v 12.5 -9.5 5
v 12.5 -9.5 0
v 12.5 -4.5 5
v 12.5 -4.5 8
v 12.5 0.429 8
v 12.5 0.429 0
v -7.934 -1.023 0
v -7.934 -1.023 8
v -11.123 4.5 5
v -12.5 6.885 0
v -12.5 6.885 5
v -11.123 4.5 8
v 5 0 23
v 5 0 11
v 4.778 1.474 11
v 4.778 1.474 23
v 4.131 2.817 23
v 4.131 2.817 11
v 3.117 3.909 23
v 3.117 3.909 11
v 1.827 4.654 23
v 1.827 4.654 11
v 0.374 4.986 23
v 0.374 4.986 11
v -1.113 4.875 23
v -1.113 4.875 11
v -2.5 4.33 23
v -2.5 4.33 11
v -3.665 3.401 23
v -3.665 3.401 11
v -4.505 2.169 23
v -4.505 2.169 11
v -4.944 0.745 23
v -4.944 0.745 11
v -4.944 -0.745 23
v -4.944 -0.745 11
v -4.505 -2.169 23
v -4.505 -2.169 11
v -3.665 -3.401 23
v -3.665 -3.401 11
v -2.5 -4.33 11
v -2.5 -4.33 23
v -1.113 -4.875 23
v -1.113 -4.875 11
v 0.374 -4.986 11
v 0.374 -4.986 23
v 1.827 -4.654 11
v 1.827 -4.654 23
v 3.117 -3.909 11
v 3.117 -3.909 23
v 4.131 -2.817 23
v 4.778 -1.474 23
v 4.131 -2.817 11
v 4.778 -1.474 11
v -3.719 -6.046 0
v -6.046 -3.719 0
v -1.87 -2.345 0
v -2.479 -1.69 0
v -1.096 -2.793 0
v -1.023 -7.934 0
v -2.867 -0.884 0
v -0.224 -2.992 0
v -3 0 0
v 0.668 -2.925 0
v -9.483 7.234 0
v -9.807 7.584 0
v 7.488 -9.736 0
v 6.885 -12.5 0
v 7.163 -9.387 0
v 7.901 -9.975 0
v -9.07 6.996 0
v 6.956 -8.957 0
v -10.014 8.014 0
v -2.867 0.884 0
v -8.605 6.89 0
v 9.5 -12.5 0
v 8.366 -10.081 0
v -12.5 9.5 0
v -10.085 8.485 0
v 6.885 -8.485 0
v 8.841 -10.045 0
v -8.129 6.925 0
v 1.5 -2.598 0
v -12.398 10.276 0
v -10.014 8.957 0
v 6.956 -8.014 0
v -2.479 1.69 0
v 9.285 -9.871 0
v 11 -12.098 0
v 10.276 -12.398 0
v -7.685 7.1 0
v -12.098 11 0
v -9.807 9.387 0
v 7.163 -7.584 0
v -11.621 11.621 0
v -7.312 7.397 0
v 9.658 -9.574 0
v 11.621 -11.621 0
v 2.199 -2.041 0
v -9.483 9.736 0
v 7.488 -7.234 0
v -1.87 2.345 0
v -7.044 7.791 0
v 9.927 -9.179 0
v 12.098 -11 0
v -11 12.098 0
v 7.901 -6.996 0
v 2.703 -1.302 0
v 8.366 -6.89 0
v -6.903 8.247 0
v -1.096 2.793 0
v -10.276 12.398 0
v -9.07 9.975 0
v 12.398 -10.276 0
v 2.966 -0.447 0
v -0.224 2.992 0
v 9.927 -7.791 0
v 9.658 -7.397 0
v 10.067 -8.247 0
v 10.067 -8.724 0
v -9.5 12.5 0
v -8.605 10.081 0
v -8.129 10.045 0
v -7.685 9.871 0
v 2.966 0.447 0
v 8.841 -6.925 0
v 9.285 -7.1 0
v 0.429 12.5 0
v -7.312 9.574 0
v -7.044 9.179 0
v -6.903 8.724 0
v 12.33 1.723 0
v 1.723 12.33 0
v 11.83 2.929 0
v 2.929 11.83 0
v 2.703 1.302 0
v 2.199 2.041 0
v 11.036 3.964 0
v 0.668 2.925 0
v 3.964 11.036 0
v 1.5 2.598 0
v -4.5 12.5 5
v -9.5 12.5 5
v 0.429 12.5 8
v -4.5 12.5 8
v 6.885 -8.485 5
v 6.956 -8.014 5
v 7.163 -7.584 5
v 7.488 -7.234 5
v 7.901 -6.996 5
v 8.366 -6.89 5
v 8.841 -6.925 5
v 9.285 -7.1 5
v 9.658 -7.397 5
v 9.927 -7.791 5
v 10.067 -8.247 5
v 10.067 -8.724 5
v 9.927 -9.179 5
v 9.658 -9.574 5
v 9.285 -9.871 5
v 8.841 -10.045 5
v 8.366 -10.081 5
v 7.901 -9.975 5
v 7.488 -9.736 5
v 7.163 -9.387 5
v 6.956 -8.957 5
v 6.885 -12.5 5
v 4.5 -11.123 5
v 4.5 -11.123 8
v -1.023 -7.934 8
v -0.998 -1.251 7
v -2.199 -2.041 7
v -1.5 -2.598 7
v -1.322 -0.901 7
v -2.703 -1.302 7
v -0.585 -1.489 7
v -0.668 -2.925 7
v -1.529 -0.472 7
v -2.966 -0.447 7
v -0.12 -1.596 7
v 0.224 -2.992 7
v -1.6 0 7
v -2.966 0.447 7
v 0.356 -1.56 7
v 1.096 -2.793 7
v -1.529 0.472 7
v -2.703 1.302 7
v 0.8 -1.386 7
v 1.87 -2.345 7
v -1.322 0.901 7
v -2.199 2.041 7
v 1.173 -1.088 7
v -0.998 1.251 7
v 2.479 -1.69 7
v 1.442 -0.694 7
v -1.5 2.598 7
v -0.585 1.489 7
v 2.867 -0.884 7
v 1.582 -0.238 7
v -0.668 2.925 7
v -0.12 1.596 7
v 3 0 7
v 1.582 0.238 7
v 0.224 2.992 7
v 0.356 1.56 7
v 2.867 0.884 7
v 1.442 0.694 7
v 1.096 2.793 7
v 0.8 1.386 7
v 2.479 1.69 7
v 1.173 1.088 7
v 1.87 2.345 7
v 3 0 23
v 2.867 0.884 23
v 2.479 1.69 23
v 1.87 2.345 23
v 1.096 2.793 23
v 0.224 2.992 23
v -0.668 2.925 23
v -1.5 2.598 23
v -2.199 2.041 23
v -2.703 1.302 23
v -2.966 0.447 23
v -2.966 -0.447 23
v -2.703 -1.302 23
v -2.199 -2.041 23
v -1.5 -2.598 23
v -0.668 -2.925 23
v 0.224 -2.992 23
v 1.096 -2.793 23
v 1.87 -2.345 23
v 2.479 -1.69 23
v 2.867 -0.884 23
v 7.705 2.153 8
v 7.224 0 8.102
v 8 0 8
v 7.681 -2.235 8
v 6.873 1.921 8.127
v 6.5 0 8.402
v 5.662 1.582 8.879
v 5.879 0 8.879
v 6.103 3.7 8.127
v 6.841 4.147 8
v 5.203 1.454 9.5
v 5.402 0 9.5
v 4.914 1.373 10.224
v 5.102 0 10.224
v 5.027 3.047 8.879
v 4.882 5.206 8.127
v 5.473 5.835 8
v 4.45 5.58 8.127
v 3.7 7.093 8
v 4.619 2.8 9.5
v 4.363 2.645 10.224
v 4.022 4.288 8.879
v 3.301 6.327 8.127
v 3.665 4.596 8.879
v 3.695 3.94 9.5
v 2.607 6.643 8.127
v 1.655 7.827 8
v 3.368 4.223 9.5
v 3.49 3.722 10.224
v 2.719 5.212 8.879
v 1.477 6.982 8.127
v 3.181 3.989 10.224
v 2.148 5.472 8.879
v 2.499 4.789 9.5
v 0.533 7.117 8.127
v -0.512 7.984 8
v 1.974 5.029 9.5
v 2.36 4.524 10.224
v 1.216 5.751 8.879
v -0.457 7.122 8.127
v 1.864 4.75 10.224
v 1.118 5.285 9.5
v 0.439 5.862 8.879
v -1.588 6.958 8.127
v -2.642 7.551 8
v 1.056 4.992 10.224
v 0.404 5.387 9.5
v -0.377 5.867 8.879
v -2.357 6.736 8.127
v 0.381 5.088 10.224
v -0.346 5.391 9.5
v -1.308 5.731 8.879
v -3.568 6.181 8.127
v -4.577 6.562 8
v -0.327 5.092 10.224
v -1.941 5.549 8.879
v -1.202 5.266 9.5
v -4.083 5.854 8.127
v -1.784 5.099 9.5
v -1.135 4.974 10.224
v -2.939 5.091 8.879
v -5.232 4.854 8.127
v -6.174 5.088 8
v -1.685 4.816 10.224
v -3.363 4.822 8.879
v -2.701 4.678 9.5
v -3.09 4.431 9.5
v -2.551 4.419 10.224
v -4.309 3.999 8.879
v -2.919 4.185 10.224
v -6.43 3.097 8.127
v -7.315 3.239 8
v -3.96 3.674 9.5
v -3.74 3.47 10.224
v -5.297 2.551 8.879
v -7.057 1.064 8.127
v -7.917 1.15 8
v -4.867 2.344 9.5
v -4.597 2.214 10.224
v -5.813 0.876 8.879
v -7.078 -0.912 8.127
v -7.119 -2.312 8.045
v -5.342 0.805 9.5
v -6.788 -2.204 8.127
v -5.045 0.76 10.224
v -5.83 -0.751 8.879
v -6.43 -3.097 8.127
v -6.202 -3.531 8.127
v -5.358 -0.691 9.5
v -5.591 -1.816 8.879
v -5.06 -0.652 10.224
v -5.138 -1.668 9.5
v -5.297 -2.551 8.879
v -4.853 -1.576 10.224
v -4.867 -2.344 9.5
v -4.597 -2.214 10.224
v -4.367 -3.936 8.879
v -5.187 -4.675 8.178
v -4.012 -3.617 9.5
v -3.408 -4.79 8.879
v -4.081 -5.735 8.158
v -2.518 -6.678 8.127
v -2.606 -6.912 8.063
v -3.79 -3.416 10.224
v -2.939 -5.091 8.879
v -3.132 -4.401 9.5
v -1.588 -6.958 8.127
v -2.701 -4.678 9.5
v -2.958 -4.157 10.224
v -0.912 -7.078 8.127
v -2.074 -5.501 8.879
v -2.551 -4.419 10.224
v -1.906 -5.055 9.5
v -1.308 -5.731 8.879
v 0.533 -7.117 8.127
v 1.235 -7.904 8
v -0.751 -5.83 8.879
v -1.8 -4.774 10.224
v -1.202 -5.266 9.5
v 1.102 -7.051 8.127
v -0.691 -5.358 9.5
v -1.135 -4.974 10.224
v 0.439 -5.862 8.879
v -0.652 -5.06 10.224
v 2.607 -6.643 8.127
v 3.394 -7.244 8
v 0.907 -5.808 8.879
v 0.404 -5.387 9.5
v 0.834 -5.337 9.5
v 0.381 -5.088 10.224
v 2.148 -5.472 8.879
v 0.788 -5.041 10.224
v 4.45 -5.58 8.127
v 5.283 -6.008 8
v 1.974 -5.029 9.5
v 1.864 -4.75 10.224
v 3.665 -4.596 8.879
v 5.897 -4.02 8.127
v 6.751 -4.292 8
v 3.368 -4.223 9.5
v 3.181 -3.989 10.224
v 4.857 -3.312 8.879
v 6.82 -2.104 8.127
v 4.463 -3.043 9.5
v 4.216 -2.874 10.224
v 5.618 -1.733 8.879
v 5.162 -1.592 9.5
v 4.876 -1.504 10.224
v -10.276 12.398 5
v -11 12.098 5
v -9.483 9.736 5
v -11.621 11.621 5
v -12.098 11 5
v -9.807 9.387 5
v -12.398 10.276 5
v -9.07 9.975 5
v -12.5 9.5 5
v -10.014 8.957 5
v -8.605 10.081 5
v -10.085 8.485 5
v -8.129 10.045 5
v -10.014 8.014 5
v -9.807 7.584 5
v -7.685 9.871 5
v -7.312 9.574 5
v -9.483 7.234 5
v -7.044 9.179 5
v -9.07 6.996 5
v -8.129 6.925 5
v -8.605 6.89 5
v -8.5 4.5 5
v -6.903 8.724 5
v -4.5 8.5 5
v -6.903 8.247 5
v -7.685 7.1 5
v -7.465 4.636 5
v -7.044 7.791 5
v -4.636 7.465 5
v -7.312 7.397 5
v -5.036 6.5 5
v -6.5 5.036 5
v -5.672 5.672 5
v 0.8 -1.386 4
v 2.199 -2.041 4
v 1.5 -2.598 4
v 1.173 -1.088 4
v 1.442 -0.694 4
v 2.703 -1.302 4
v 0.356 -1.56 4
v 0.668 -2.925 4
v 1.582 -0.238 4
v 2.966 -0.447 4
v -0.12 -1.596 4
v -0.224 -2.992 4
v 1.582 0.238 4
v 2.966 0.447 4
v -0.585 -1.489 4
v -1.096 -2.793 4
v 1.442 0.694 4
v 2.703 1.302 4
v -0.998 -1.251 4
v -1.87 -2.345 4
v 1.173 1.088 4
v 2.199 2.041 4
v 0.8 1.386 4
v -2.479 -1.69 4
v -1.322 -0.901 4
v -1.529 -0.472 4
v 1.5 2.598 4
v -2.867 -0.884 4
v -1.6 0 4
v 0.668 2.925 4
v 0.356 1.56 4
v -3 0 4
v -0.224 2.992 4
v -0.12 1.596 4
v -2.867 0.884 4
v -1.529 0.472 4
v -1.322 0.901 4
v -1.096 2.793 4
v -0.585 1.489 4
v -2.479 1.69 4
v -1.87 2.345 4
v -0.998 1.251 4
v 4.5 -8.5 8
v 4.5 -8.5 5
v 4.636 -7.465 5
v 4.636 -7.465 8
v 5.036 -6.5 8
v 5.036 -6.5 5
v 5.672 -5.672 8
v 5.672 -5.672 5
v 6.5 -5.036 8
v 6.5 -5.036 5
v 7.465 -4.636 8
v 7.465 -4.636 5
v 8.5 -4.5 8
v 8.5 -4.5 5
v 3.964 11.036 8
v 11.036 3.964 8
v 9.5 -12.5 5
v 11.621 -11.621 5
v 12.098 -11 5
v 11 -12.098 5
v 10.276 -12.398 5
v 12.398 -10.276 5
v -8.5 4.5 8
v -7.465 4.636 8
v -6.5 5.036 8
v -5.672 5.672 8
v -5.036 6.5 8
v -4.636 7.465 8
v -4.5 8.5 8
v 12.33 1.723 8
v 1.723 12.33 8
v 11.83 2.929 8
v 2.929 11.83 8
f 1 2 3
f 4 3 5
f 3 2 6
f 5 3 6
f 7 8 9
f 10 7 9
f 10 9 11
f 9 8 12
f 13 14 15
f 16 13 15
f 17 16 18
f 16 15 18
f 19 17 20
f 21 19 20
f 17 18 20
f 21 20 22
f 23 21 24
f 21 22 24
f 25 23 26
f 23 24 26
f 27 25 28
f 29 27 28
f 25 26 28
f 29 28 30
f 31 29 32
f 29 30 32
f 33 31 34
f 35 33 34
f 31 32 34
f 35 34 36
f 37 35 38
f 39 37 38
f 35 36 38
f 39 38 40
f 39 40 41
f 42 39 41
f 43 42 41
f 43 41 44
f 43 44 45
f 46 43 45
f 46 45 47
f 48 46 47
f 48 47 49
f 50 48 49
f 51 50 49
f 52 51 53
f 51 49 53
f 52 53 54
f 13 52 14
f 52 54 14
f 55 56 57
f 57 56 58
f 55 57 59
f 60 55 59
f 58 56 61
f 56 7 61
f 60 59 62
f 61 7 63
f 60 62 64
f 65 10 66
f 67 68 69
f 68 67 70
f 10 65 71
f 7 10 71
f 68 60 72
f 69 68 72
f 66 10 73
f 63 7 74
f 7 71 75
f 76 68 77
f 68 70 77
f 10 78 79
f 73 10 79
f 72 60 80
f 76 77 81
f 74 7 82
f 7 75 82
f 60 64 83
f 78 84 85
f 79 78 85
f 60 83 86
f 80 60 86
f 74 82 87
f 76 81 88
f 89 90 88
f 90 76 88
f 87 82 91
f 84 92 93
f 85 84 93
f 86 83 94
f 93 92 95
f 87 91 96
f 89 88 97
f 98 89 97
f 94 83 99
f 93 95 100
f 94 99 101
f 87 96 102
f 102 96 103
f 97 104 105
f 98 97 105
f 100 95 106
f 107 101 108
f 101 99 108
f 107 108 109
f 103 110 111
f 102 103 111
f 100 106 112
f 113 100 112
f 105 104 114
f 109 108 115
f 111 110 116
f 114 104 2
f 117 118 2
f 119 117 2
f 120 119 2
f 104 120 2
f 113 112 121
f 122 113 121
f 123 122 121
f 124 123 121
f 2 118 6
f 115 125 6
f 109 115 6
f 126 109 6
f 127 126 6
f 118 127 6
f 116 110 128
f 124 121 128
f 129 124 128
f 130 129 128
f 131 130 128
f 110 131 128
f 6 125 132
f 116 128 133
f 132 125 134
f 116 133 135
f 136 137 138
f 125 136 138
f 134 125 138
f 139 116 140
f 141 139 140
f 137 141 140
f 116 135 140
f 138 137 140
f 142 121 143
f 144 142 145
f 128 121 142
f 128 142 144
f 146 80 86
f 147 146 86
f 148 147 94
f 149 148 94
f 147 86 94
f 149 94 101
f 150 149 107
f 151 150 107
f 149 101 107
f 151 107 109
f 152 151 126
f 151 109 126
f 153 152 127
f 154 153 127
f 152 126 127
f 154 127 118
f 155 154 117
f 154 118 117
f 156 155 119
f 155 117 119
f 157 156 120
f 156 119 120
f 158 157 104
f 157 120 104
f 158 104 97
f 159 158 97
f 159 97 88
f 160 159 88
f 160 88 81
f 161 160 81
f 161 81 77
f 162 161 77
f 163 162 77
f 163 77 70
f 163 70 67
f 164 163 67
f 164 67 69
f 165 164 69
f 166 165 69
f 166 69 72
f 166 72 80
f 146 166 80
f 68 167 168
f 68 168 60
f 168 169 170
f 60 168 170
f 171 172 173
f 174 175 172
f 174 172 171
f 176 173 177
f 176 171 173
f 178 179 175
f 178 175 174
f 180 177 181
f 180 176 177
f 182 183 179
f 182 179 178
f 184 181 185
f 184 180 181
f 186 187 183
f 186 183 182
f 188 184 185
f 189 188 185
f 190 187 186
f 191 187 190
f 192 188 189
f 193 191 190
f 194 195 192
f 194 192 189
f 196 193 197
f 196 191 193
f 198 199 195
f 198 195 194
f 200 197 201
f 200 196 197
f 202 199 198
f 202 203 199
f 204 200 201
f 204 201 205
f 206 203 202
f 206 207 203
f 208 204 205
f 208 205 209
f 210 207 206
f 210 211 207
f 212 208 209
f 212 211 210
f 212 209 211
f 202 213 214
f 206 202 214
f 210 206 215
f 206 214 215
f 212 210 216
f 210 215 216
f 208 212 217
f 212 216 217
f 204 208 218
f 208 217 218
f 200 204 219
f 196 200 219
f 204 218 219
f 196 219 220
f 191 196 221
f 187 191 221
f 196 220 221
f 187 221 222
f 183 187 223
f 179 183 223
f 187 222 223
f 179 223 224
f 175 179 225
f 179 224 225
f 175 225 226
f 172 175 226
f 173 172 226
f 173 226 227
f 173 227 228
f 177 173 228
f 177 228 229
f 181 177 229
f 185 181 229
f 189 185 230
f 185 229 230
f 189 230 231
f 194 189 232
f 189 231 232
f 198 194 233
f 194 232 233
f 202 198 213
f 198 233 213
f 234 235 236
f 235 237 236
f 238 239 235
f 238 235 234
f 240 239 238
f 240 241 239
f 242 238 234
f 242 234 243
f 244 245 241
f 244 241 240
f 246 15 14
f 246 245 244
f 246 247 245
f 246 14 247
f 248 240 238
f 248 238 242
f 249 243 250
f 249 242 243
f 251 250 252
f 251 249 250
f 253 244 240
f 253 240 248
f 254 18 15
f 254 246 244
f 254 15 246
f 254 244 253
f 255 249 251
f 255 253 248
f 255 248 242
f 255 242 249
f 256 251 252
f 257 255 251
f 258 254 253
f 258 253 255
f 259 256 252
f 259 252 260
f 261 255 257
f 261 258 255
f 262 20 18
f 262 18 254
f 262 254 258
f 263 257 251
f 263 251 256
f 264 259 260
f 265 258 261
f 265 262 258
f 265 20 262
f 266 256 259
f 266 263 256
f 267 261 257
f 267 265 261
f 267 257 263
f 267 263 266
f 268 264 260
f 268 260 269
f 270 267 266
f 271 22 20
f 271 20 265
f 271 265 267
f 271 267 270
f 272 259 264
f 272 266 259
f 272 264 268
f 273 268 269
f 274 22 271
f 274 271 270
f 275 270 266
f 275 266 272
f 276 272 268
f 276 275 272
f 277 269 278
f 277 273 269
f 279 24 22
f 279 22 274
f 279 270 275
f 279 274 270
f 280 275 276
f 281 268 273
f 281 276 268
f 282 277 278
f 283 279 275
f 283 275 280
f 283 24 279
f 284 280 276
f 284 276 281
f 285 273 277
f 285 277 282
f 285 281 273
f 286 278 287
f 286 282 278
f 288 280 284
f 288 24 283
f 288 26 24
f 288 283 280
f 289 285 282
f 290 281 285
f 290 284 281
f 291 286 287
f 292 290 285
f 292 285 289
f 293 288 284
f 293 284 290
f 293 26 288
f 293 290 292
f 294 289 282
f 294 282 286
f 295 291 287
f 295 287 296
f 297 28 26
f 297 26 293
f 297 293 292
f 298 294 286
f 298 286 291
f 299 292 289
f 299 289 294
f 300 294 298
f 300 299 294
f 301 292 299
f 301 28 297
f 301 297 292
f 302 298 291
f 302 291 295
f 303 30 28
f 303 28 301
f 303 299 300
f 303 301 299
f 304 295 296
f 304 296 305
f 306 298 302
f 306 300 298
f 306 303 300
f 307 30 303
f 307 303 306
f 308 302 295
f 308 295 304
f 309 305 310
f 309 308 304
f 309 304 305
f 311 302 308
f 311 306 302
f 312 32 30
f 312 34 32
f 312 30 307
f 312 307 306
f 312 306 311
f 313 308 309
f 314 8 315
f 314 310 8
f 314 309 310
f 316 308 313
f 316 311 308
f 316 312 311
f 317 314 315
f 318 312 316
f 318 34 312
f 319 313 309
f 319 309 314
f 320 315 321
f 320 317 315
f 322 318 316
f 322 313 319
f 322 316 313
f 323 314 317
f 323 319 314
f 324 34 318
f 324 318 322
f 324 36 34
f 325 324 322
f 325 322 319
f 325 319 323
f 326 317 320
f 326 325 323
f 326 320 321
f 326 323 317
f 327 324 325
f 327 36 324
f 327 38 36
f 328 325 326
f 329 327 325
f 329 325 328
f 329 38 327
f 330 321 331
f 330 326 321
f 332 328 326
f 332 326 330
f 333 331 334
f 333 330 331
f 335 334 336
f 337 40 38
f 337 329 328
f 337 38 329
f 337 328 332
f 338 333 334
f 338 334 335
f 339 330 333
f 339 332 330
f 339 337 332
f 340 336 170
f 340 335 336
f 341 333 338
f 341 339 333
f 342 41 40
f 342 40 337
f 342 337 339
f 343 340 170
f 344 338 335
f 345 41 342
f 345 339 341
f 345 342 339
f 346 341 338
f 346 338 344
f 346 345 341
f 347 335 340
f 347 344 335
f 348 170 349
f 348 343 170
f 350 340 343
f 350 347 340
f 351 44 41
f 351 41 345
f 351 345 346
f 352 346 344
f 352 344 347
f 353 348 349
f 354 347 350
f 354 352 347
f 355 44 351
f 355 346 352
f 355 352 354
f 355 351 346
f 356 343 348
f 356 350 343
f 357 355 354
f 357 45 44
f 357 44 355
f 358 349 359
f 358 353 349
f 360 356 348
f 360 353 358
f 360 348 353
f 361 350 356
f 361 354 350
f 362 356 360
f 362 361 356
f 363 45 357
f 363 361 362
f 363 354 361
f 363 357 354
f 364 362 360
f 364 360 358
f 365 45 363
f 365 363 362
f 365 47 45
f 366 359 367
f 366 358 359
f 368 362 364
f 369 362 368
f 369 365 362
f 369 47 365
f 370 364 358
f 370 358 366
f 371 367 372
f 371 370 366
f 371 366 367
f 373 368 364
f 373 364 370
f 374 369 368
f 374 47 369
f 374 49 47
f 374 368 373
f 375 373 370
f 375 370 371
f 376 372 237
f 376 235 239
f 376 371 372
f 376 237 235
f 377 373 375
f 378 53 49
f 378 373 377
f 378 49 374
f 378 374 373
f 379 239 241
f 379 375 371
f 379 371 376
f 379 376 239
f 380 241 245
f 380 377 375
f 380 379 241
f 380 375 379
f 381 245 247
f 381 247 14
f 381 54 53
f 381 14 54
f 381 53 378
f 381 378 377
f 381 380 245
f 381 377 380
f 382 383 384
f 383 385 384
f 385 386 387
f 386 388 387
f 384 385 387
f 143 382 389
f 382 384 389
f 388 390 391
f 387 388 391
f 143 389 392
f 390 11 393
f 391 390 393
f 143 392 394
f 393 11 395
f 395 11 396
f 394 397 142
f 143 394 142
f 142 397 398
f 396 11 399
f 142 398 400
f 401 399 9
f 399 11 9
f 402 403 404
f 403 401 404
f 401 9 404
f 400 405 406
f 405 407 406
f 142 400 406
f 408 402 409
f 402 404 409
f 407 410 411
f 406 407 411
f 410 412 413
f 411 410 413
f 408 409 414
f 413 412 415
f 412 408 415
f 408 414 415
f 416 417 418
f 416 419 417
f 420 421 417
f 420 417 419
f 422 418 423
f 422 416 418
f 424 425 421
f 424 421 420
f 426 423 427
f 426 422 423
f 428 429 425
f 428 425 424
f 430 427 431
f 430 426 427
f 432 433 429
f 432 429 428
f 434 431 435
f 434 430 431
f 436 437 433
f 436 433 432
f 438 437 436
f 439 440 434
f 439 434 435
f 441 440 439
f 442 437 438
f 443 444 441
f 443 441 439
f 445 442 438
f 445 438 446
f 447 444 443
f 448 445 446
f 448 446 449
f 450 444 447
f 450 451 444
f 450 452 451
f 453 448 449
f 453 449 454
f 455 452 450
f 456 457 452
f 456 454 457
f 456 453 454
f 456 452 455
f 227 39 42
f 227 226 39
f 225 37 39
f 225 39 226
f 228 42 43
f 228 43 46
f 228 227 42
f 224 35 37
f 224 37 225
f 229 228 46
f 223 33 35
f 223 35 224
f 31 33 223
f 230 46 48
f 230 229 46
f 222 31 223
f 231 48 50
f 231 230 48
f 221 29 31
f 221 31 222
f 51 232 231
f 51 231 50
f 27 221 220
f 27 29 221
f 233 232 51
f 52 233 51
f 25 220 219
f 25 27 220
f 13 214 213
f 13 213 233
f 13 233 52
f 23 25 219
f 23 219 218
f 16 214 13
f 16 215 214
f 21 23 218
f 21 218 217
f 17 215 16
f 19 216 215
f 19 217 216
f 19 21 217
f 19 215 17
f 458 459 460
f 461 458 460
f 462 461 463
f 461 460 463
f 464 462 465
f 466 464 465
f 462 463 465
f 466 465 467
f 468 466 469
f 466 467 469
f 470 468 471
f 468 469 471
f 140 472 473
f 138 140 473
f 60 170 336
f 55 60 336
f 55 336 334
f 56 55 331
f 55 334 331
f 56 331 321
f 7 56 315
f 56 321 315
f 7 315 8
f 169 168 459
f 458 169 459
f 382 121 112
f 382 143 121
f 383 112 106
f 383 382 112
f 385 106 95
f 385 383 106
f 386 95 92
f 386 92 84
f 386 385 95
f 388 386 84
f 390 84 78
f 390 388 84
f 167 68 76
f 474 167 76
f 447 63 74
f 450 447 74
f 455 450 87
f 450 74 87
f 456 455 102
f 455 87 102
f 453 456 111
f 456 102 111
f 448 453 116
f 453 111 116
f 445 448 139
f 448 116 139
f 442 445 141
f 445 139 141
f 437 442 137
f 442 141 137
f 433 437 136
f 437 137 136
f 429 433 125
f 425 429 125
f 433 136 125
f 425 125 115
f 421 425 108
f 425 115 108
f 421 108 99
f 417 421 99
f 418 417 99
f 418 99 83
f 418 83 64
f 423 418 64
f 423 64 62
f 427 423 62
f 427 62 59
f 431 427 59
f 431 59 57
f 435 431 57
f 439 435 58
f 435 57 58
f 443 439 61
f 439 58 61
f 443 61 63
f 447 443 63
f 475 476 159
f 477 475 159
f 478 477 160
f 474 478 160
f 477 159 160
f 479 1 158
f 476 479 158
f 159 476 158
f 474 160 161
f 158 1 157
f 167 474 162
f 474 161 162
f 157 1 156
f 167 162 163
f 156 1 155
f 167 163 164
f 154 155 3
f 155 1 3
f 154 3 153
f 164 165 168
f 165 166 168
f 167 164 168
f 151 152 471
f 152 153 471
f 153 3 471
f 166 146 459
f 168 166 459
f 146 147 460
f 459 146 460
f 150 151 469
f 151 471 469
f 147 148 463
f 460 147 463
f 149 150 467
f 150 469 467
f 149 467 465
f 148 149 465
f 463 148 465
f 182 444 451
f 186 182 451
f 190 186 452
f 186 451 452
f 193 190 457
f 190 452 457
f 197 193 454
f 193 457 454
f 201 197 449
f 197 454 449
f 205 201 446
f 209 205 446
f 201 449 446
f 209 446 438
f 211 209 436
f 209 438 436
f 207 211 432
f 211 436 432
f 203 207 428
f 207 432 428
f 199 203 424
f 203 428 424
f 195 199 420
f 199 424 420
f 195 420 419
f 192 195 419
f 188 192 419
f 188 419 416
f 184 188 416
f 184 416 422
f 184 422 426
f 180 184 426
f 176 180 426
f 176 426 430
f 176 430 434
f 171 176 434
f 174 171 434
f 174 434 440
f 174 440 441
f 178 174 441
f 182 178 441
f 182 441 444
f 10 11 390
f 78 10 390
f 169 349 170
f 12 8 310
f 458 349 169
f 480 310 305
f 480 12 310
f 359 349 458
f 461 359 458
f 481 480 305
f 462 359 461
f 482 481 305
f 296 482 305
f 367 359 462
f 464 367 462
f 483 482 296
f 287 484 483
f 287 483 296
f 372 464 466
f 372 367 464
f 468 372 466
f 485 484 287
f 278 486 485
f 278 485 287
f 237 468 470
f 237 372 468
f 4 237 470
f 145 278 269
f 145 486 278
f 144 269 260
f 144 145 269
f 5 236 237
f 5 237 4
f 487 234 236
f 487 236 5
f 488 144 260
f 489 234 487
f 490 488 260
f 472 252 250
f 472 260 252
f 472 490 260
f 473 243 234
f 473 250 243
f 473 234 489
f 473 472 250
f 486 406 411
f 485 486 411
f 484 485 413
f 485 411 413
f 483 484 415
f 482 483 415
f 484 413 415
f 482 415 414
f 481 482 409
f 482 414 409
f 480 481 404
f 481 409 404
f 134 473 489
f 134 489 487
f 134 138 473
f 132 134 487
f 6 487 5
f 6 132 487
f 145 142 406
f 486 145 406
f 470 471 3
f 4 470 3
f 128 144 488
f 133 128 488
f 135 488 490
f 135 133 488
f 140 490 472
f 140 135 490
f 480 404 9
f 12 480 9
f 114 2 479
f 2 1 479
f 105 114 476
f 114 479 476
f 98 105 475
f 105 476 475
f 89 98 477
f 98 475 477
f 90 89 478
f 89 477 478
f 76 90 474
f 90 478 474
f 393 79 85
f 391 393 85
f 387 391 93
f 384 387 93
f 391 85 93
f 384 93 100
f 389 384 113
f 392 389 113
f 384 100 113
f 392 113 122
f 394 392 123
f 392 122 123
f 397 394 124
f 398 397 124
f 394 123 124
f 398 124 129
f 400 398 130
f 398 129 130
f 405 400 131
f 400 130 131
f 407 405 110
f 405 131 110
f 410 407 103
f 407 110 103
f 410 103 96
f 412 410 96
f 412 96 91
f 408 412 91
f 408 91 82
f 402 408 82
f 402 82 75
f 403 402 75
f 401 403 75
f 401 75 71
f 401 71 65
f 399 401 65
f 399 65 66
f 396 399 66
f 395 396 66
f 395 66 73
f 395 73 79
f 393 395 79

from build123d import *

# Parameters (mm, degrees)
SCHIZZO1_W                            = 25
SCHIZZO1_H                            = 25
ESTRUSIONE_ESTRUSIONE1_DEPTH          = 8
SCHIZZO8_R                            = 5
ESTRUSIONE_ESTRUSIONE3_DEPTH          = 15
RACCORDO1_R                           = 3
TAGLIO_ESTRUSIONE2_REACH              = 25
SCHIZZO9_R                            = 1.6
SCHIZZO10_R                           = 3
TAGLIO_ESTRUSIONE3_DEPTH              = 4
SCHIZZO11_R                           = 3
TAGLIO_ESTRUSIONE4_DEPTH              = 16
TAGLIO_ESTRUSIONE6_REACH              = 25
SCHIZZO13_R                           = 1.6
TAGLIO_ESTRUSIONE8_START              = -3
TAGLIO_ESTRUSIONE8_DEPTH              = 19
RIPETIZIONECIRCOLARE1_COUNT           = 2
RIPETIZIONECIRCOLARE1_ANGLE           = 180
TAGLIO_ESTRUSIONE9_REACH              = 10
RACCORDO2_R                           = 5
RACCORDO3_R                           = 3
TAGLIO_ESTRUSIONE10_REACH             = 10
TAGLIO_ESTRUSIONE10_DIRECTION_2_REACH = 17


with BuildPart() as part:
    # Schizzo1 → Estrusione-Estrusione1 (new body)
    with BuildSketch(Plane.XY):
        Rectangle(SCHIZZO1_W, SCHIZZO1_H)
    extrude(amount=ESTRUSIONE_ESTRUSIONE1_DEPTH)

    # Schizzo8 → Estrusione-Estrusione3 (add)
    with BuildSketch(Plane.XY.offset(8)):
        Circle(SCHIZZO8_R)
    extrude(amount=ESTRUSIONE_ESTRUSIONE3_DEPTH)

    # Raccordo1
    raccordo1_edges = [part.edges().sort_by_distance(p)[0] for p in [
        (-5, 0, 8),
    ]]
    fillet(raccordo1_edges, radius=RACCORDO1_R)

    # Schizzo9 → Taglio-Estrusione2 (cut, up to next)
    with BuildSketch(Plane(origin=(0, 0, 0), x_dir=(-1, 0, 0), z_dir=(0, 0, -1)), mode=Mode.PRIVATE) as taglio_estrusione2_sk1:
        Circle(SCHIZZO9_R)
    taglio_estrusione2_tool1 = extrude(taglio_estrusione2_sk1.sketch, amount=-TAGLIO_ESTRUSIONE2_REACH, mode=Mode.PRIVATE) & part.part
    add(taglio_estrusione2_tool1.solids().sort_by_distance((0, 0, 0))[0], mode=Mode.SUBTRACT)

    # Schizzo10 → Taglio-Estrusione3 (cut)
    with BuildSketch(Plane(origin=(0, 0, 0), x_dir=(-1, 0, 0), z_dir=(0, 0, -1))):
        Circle(SCHIZZO10_R)
    extrude(amount=-TAGLIO_ESTRUSIONE3_DEPTH, mode=Mode.SUBTRACT)

    # Schizzo11 → Taglio-Estrusione4 (cut)
    with BuildSketch(Plane.XY.offset(23)):
        Circle(SCHIZZO11_R)
    extrude(amount=-TAGLIO_ESTRUSIONE4_DEPTH, mode=Mode.SUBTRACT)

    # Schizzo13 → Taglio-Estrusione6 (cut, up to next)
    with BuildSketch(Plane(origin=(0, 0, 0), x_dir=(-1, 0, 0), z_dir=(0, 0, -1)), mode=Mode.PRIVATE) as taglio_estrusione6_sk1:
        with Locations((-8.485281374, -8.485281374)):
            Circle(SCHIZZO13_R)
    taglio_estrusione6_tool1 = extrude(taglio_estrusione6_sk1.sketch, amount=-TAGLIO_ESTRUSIONE6_REACH, mode=Mode.PRIVATE) & part.part
    add(taglio_estrusione6_tool1.solids().sort_by_distance((8.485281, -8.485281, 0))[0], mode=Mode.SUBTRACT)
    # Schizzo13 → Taglio-Estrusione6 (cut, up to next)
    with BuildSketch(Plane(origin=(0, 0, 0), x_dir=(-1, 0, 0), z_dir=(0, 0, -1)), mode=Mode.PRIVATE) as taglio_estrusione6_sk2:
        with Locations((8.485281374, 8.485281374)):
            Circle(SCHIZZO13_R)
    taglio_estrusione6_tool2 = extrude(taglio_estrusione6_sk2.sketch, amount=-TAGLIO_ESTRUSIONE6_REACH, mode=Mode.PRIVATE) & part.part
    add(taglio_estrusione6_tool2.solids().sort_by_distance((-8.485281, 8.485281, 0))[0], mode=Mode.SUBTRACT)

    # Schizzo17 → Taglio-Estrusione8 (cut)
    with BuildSketch(Plane.XY.offset(8).offset(TAGLIO_ESTRUSIONE8_START)):
        with BuildLine():
            Line((4.5, -12.5), (4.5, -8.5))
            ThreePointArc((4.5, -8.5), (5.671572875, -5.671572875), (8.5, -4.5))
            Line((8.5, -4.5), (12.5, -4.5))
            Line((12.5, -4.5), (12.5, -12.5))
            Line((12.5, -12.5), (4.5, -12.5))
        make_face()
    taglio_estrusione8 = extrude(amount=TAGLIO_ESTRUSIONE8_DEPTH, mode=Mode.SUBTRACT)

    # RipetizioneCircolare1: Taglio-Estrusione8 ×2 about axis
    ripetizionecircolare1_axis = Axis((0, 0, 0), (0, 0, 1))
    for i in range(1, RIPETIZIONECIRCOLARE1_COUNT):
        add(taglio_estrusione8.rotate(ripetizionecircolare1_axis, i * RIPETIZIONECIRCOLARE1_ANGLE / (RIPETIZIONECIRCOLARE1_COUNT - 1)), mode=Mode.SUBTRACT)

    # Schizzo18 → Taglio-Estrusione9 (cut, up to next)
    with BuildSketch(Plane.XY.offset(8), mode=Mode.PRIVATE) as taglio_estrusione9_sk1:
        Polygon((2.5, 12.5), (12.5, 2.5), (12.5, 12.5), align=None)
    taglio_estrusione9_tool1 = extrude(taglio_estrusione9_sk1.sketch, amount=-TAGLIO_ESTRUSIONE9_REACH, mode=Mode.PRIVATE) & part.part
    add(taglio_estrusione9_tool1.solids().sort_by_distance((9.166667, 9.166667, 8))[0], mode=Mode.SUBTRACT)

    # Raccordo2
    raccordo2_edges = [part.edges().sort_by_distance(p)[0] for p in [
        (2.5, 12.5, 4),
        (12.5, 2.5, 4),
    ]]
    fillet(raccordo2_edges, radius=RACCORDO2_R)

    # Raccordo3
    raccordo3_edges = [part.edges().sort_by_distance(p)[0] for p in [
        (12.5, -12.5, 2.5),
        (-12.5, 12.5, 2.5),
    ]]
    fillet(raccordo3_edges, radius=RACCORDO3_R)

    # Schizzo19 → Taglio-Estrusione10 (cut, up to next)
    with BuildSketch(Plane.XY.offset(8), mode=Mode.PRIVATE) as taglio_estrusione10_sk1:
        with BuildLine():
            Line((4.5, -12.5), (6.885281374, -12.5))
            Line((6.885281374, -12.5), (-1.022619302, -7.934371416))
            ThreePointArc((-1.022619302, -7.934371416), (-4.933470073, -4.933470073), (-7.934371416, -1.022619302))
            Line((-7.934371416, -1.022619302), (-12.5, 6.885281374))
            Line((-12.5, 6.885281374), (-12.5, 4.5))
            Line((-12.5, 4.5), (-12.5, -12.5))
            Line((-12.5, -12.5), (4.5, -12.5))
        make_face()
    taglio_estrusione10_tool1 = extrude(taglio_estrusione10_sk1.sketch, amount=-TAGLIO_ESTRUSIONE10_REACH, mode=Mode.PRIVATE) & part.part
    add(taglio_estrusione10_tool1.solids().sort_by_distance((-6.87454, -6.87454, 8))[0], mode=Mode.SUBTRACT)

    # Schizzo19 → Taglio-Estrusione10 direction 2 (cut, up to next)
    with BuildSketch(Plane.XY.offset(8), mode=Mode.PRIVATE) as taglio_estrusione10_direction_2_sk1:
        with BuildLine():
            Line((4.5, -12.5), (6.885281374, -12.5))
            Line((6.885281374, -12.5), (-1.022619302, -7.934371416))
            ThreePointArc((-1.022619302, -7.934371416), (-4.933470073, -4.933470073), (-7.934371416, -1.022619302))
            Line((-7.934371416, -1.022619302), (-12.5, 6.885281374))
            Line((-12.5, 6.885281374), (-12.5, 4.5))
            Line((-12.5, 4.5), (-12.5, -12.5))
            Line((-12.5, -12.5), (4.5, -12.5))
        make_face()
    taglio_estrusione10_direction_2_tool1 = extrude(taglio_estrusione10_direction_2_sk1.sketch, amount=TAGLIO_ESTRUSIONE10_DIRECTION_2_REACH, mode=Mode.PRIVATE) & part.part
    add(taglio_estrusione10_direction_2_tool1.solids().sort_by_distance((-6.87454, -6.87454, 8))[0], mode=Mode.SUBTRACT)


solid = part.part
